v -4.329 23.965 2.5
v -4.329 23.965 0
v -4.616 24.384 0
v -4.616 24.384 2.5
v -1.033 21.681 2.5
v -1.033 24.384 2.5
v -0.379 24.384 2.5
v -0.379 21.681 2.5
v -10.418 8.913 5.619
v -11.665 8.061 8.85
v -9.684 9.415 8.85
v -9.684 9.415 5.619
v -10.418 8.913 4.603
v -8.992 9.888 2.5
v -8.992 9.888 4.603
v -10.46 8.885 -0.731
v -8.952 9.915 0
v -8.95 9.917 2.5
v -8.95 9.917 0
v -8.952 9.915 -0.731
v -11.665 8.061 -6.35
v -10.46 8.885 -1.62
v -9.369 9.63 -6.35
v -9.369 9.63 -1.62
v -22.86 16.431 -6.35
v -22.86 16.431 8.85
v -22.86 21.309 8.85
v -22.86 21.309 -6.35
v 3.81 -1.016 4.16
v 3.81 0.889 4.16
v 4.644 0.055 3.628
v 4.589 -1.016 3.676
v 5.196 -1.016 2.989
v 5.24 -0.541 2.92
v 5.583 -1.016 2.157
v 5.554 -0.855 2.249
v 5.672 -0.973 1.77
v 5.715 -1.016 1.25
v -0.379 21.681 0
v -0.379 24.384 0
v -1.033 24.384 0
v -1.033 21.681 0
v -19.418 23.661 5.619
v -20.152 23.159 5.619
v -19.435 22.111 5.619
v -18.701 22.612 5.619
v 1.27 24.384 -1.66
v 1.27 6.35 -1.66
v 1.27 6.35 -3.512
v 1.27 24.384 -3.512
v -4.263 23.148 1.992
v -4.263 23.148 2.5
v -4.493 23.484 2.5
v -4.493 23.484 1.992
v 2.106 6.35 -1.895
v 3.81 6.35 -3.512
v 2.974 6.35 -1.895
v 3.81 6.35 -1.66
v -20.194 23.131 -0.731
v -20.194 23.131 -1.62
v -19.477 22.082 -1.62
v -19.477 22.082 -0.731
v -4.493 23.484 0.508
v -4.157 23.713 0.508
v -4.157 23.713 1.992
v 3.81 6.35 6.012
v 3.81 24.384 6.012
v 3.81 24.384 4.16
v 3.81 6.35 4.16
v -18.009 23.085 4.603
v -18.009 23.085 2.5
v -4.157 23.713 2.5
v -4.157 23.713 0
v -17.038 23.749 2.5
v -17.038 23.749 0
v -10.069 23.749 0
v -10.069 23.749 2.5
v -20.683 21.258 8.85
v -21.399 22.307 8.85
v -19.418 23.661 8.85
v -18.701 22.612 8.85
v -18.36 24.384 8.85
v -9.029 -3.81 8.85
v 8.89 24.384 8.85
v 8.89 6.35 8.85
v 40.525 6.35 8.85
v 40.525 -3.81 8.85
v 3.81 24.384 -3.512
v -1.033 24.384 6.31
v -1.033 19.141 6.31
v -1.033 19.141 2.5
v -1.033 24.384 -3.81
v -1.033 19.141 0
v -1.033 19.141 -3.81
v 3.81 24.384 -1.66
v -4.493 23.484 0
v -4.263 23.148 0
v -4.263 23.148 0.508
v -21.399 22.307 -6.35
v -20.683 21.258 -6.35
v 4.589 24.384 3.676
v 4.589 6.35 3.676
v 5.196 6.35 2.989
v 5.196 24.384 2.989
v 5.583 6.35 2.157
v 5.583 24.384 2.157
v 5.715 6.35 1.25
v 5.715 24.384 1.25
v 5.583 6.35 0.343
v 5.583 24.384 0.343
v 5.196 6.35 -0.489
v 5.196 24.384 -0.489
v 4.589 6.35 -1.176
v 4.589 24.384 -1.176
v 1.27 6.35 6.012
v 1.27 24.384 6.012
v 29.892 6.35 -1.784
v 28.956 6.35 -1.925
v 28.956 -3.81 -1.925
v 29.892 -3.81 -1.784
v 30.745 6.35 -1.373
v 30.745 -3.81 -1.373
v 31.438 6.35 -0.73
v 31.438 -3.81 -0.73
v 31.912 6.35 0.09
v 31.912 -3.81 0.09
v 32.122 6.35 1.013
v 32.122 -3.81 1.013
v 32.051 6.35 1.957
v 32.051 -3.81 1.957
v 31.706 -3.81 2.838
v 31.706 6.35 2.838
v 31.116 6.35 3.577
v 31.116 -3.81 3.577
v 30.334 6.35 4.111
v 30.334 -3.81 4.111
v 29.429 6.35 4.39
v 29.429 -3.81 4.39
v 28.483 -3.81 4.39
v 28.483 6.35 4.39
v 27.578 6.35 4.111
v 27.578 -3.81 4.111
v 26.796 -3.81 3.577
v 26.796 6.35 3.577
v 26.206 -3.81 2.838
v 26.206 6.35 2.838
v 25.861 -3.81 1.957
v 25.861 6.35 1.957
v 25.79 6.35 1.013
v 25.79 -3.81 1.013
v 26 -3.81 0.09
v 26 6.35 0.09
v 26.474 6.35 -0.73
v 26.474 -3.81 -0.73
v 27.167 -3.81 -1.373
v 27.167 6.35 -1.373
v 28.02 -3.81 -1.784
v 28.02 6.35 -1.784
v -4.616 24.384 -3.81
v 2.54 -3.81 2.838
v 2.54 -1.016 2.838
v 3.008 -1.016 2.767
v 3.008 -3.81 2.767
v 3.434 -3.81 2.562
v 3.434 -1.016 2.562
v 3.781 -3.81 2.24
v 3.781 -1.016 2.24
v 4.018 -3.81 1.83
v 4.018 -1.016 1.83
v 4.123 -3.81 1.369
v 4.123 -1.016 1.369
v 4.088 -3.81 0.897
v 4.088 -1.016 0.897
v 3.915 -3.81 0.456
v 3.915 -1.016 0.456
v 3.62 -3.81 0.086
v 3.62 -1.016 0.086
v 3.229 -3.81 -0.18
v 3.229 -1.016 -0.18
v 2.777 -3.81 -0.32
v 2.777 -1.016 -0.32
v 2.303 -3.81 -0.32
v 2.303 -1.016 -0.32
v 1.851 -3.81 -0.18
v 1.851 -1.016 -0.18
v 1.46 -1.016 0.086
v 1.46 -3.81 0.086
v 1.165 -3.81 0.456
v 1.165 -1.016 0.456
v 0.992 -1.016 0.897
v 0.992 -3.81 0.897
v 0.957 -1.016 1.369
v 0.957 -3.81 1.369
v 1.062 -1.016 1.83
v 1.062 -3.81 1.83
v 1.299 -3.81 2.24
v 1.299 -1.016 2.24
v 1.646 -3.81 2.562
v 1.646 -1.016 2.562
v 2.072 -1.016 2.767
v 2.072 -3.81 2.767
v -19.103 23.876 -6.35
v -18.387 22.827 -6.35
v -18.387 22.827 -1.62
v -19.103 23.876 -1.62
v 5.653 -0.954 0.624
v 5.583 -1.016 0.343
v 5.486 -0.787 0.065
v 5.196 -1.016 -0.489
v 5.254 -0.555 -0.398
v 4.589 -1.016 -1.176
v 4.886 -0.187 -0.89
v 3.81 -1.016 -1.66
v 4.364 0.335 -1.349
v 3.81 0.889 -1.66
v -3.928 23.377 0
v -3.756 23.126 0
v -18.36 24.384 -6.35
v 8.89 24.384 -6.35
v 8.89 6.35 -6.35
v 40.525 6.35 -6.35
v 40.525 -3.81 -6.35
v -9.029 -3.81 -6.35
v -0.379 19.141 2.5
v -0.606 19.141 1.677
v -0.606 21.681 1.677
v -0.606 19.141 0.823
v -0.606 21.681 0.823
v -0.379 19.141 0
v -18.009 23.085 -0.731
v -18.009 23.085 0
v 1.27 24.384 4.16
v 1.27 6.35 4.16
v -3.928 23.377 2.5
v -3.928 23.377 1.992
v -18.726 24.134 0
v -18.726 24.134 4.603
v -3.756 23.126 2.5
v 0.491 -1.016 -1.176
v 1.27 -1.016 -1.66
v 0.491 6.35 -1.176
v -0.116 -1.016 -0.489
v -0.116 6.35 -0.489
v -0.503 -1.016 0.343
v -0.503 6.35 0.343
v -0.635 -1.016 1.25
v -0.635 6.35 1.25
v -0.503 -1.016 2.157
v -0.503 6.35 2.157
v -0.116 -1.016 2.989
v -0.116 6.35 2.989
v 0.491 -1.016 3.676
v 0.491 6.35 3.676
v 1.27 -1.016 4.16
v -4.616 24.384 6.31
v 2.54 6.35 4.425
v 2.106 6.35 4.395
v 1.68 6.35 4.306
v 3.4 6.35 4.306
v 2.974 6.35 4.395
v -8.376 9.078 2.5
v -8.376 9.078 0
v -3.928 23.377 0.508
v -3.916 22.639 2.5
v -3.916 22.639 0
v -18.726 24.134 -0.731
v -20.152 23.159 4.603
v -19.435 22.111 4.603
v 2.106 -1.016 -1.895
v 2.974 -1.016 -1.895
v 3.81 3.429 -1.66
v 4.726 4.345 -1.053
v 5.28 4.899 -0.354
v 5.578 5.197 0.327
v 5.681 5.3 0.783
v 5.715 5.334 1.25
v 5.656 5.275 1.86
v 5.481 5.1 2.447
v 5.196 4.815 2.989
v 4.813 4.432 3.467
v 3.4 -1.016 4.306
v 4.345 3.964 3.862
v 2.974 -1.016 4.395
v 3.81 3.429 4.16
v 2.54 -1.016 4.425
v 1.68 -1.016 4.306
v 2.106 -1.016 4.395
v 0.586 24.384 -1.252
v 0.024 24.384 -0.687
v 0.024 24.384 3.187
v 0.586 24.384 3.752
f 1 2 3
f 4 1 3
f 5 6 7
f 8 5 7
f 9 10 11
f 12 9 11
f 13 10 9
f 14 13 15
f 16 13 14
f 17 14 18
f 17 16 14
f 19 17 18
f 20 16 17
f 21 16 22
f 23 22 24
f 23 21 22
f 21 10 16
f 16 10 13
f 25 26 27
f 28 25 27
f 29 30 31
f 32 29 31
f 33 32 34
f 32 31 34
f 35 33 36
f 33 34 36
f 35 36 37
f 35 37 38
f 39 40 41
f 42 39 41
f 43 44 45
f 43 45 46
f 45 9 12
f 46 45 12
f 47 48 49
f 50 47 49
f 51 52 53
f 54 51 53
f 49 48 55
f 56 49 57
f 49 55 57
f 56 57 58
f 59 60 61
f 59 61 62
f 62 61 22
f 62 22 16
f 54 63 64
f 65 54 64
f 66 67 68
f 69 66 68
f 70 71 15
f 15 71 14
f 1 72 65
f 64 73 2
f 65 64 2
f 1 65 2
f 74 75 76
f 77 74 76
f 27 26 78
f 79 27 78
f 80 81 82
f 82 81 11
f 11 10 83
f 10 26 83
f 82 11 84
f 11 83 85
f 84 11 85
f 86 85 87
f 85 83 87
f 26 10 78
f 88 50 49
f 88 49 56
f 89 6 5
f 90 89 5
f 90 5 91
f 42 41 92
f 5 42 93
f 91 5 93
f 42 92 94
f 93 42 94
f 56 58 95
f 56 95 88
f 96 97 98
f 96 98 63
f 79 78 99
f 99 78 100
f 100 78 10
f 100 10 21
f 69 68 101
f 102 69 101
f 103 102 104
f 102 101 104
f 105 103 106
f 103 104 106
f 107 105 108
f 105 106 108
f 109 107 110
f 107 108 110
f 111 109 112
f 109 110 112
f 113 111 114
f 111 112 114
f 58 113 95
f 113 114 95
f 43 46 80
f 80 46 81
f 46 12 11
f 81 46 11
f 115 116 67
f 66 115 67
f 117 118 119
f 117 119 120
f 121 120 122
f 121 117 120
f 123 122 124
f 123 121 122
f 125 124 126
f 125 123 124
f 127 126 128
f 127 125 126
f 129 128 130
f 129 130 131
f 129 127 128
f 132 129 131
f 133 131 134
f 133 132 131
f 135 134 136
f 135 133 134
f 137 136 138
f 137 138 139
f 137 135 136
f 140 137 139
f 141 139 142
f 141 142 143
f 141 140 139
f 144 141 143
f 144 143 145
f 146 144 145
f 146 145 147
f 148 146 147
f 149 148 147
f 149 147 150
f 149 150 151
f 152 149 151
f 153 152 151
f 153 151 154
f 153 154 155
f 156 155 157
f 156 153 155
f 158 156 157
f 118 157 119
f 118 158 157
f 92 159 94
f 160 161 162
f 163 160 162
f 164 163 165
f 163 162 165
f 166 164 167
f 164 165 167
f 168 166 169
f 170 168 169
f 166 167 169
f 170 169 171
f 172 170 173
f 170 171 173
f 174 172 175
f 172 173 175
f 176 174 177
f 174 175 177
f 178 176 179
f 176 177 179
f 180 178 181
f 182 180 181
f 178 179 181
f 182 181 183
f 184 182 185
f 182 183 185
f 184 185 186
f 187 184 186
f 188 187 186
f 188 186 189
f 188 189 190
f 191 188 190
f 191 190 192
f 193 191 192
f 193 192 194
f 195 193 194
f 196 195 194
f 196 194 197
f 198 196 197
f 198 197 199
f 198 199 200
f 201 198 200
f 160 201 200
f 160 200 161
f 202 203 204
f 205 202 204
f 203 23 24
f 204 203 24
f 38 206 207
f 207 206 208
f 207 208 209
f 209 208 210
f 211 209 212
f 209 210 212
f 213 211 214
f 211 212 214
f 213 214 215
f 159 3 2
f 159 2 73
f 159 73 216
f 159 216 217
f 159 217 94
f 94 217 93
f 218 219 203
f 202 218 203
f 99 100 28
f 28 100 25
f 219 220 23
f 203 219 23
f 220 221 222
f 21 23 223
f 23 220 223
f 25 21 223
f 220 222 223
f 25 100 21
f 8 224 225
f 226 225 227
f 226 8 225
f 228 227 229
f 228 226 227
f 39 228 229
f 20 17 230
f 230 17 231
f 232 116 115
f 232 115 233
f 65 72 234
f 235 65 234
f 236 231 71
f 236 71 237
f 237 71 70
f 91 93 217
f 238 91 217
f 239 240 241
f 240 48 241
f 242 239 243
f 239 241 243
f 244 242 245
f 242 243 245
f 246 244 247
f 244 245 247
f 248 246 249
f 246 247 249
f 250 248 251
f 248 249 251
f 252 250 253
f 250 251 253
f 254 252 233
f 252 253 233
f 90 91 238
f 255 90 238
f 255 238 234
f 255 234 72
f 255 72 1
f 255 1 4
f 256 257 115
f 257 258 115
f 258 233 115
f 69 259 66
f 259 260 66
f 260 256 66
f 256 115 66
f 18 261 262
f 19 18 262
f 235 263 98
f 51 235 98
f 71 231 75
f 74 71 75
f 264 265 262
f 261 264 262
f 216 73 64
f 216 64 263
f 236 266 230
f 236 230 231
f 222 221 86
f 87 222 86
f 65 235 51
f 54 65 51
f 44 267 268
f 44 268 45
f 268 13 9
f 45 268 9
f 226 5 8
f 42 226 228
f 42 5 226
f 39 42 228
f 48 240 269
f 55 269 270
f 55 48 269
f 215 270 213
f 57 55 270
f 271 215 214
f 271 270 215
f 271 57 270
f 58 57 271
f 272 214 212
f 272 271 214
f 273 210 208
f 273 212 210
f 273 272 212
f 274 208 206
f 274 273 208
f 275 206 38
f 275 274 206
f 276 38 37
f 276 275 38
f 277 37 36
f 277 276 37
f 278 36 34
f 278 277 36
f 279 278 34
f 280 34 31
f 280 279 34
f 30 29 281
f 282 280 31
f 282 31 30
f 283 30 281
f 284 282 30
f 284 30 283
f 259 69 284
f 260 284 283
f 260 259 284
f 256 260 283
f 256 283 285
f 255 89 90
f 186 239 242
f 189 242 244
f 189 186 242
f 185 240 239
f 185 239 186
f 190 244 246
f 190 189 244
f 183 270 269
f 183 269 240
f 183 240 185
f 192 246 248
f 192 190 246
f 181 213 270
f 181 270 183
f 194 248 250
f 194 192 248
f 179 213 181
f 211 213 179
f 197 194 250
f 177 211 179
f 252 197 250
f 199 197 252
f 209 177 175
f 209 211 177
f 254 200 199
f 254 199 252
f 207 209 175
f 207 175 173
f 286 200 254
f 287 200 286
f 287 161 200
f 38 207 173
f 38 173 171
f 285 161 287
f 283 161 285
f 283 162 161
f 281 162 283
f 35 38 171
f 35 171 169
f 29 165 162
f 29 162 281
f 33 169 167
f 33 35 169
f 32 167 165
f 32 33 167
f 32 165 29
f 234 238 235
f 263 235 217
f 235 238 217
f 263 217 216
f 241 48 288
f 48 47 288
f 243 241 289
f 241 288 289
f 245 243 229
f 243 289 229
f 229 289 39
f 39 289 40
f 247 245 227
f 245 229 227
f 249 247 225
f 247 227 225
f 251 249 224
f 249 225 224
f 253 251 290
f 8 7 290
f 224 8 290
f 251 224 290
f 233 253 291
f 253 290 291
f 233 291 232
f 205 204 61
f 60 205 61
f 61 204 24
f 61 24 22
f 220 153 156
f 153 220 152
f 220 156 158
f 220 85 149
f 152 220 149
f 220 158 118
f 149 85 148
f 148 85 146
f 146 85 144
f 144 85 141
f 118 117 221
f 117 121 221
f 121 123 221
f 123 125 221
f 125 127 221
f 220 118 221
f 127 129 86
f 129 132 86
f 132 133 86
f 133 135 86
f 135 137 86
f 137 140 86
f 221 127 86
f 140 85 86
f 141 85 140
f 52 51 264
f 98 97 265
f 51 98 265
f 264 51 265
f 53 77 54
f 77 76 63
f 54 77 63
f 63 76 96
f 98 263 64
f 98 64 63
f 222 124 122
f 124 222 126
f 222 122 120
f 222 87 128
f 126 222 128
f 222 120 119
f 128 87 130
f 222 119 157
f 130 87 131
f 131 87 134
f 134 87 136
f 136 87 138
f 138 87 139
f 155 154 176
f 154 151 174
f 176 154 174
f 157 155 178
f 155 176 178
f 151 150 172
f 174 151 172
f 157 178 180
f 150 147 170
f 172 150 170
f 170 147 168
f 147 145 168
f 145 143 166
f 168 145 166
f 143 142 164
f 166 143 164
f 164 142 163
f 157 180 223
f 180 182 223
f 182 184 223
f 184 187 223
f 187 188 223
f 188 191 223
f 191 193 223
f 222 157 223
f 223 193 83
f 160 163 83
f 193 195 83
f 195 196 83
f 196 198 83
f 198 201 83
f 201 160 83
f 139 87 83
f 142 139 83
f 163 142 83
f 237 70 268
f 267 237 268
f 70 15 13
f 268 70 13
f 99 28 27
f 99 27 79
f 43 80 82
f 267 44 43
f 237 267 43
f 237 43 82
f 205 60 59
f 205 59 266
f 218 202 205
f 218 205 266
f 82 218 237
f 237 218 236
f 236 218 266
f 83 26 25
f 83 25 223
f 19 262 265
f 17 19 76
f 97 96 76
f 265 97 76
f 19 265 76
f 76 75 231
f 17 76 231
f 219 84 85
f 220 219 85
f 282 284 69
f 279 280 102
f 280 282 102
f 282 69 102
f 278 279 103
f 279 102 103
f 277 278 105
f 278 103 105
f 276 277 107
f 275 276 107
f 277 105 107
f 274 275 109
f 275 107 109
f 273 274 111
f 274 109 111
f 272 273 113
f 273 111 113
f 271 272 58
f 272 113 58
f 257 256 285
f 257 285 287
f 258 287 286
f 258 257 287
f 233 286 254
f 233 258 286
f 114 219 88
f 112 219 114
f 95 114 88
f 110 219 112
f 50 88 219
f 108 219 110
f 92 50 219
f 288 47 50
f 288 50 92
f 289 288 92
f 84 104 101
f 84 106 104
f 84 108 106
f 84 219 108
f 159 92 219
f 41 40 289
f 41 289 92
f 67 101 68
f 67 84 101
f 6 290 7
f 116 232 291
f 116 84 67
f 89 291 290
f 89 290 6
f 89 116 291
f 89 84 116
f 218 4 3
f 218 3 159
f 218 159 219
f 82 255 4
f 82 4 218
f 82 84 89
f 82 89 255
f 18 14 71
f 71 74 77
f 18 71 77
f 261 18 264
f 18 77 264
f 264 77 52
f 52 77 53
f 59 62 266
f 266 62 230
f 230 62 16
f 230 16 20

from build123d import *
from build123d.topology import SkipClean

# Parameters (mm, degrees)
BOSS_EXTRUDE1_DEPTH     = 2.5
BOSS_EXTRUDE1_2_DEPTH   = 2.5
BOSS_EXTRUDE2_DEPTH     = 6.35
BOSS_EXTRUDE3_DEPTH     = 6.35
SKETCH4_R               = 3.175
CUT_EXTRUDE1_DEPTH      = 25.4
SKETCH5_R               = 1.5875
CUT_EXTRUDE2_DEPTH      = 25.4
CUT_EXTRUDE3_DEPTH      = 25.4
CUT_EXTRUDE4_REACH      = 43
CUT_EXTRUDE4_END_RADIUS = 3.175
CUT_EXTRUDE5_REACH      = 39.36
SKETCH8_W               = 2.54
SKETCH8_H               = 9.525
SKETCH9_W               = 0.7112
SKETCH9_H               = 15.2
BOSS_EXTRUDE4_DEPTH     = 17
BOSS_EXTRUDE5_DEPTH     = 1.016
SKETCH11_W              = 1.176658287
SKETCH11_H              = 2.5
SKETCH11_W_2            = 2.636987944
SKETCH11_H_2            = 15.2
BOSS_EXTRUDE6_DEPTH     = 1.27
CUT_EXTRUDE6_DEPTH      = 38.864332241
BOSS_EXTRUDE7_START     = 2.54
BOSS_EXTRUDE7_DEPTH     = 2.54
BOSS_EXTRUDE8_DEPTH     = 2.54
BOSS_EXTRUDE9_DEPTH     = 0.508
BOSS_EXTRUDE10_DEPTH    = 0.508
CUT_EXTRUDE7_DEPTH      = 3.81
CUT_EXTRUDE8_DEPTH      = 3.81
BOSS_EXTRUDE11_DEPTH    = 3.81
BOSS_EXTRUDE12_START    = -10.16
SKETCH21_W              = 49.554714962
SKETCH21_H              = 15.2
SKETCH21_R              = 3.175
BOSS_EXTRUDE12_DEPTH    = 10.16


with BuildPart() as part:
    # Sketch1 → Boss-Extrude1 (new body)
    with BuildSketch(Plane.XY):
        Polygon((5.08, 0), (0, 0), (0, 19.141079028), (-1.033059908, 19.141079028), (-3.75575709, 23.125698967), (-8.376397661, 9.077684872), (-11.679025045, 6.820994294), (-21.26996, 20.857160675), (-22.86, 19.770683798), (-22.86, -3.81), (8.89, -3.81), (8.89, 24.384), (5.08, 24.384), align=None)
    extrude(amount=BOSS_EXTRUDE1_DEPTH)



with BuildPart() as body_2:
    # Sketch1 → Boss-Extrude1 2 (new body)
    with BuildSketch(Plane.XY):
        Polygon((-10.069369191, 23.749), (-4.328956497, 23.964566322), (-4.615556201, 24.384), (-16.108492032, 24.384), (-17.03780348, 23.749), align=None)
    extrude(amount=BOSS_EXTRUDE1_2_DEPTH)


with BuildPart() as part_1:
    add(part.part)

    add(body_2.part)  # Boss-Extrude2 merges body 2
    # Sketch2 → Boss-Extrude2 (add)
    with BuildSketch(Plane.XY.offset(2.5)):
        Polygon((-11.679025045, 6.820994294), (-21.26996, 20.857160675), (-22.86, 19.770683798), (-22.86, -3.81), (8.89, -3.81), (8.89, 24.384), (5.08, 24.384), (5.08, 0), (0, 0), (0, 19.141079028), (-1.033059908, 19.141079028), (-3.75575709, 23.125698967), (-8.376397661, 9.077684872), align=None)
        Polygon((-16.108492032, 24.384), (-18.00931945, 23.085161582), (-8.418384495, 9.048995201), (-8.376397661, 9.077684872), (-3.75575709, 23.125698967), (-1.033059908, 19.141079028), (0, 19.141079028), (0, 0), (5.08, 0), (5.08, 24.384), align=None)
    extrude(amount=BOSS_EXTRUDE2_DEPTH)

    # Sketch3 → Boss-Extrude3 (add)
    with BuildSketch(Plane(origin=(0, 0, 0), x_dir=(-1, 0, 0), z_dir=(0, 0, -1))):
        Polygon((-8.89, 24.384), (-8.89, -3.81), (22.86, -3.81), (22.86, 19.770683798), (21.26996, 20.857160675), (11.679025045, 6.820994294), (8.376397661, 9.077684872), (18.00931945, 23.085161582), (16.108492032, 24.384), align=None)
    extrude(amount=BOSS_EXTRUDE3_DEPTH)

    # Sketch4 → Cut-Extrude1 (cut)
    with BuildSketch(Plane(origin=(0, 24.384, 0), x_dir=(1, 0, 0), z_dir=(0, 1, 0))):
        with Locations(Location((2.54, -1.25, 0), (0, 0, 270))):
            Circle(SKETCH4_R)
    extrude(amount=-CUT_EXTRUDE1_DEPTH, mode=Mode.SUBTRACT)

    # Sketch5 → Cut-Extrude2 (cut)
    with BuildSketch(Plane(origin=(0, -1.016, 0), x_dir=(1, 0, 0), z_dir=(0, 1, 0))):
        with Locations(Location((2.54, -1.25, 0), (0, 0, 270))):
            Circle(SKETCH5_R)
    extrude(amount=-CUT_EXTRUDE2_DEPTH, mode=Mode.SUBTRACT)

    # Sketch6 → Cut-Extrude3 (cut)
    with BuildSketch(Plane.XY.offset(8.85)):
        Polygon((-22.86, 16.430904611), (-9.029357481, -3.81), (-22.86, -3.81), align=None)
    extrude(amount=-CUT_EXTRUDE3_DEPTH, mode=Mode.SUBTRACT)

    # Cut-Extrude4: up to this cylinder (the profile starts outside it)
    with SkipClean():  # the faces are left unmerged after this step: merging them gives an invalid solid
        cut_extrude4_end = Plane(origin=(2.54, 2.159, 1.25), z_dir=(0, 1, 0)) * Cylinder(CUT_EXTRUDE4_END_RADIUS, 96.045024, mode=Mode.PRIVATE)
        # Sketch7 → Cut-Extrude4 (cut, up to the surface)
        with BuildSketch(Plane(origin=(8.89, 0, 0), x_dir=(0, 0, -1), z_dir=(1, 0, 0)), mode=Mode.PRIVATE) as cut_extrude4_sk1:
            with BuildLine():
                ThreePointArc((1.925, 2.159), (-1.25, 5.334), (-4.425, 2.159))
                Line((-4.425, 2.159), (1.925, 2.159))
            make_face()
        cut_extrude4_tool1 = extrude(cut_extrude4_sk1.sketch, amount=-CUT_EXTRUDE4_REACH, mode=Mode.PRIVATE) - cut_extrude4_end
        add(cut_extrude4_tool1.solids().sort_by_distance((8.89, 3.506512, 1.25))[0], mode=Mode.SUBTRACT)
        # Sketch7 → Cut-Extrude4 (cut, up to the surface)
        with BuildSketch(Plane(origin=(8.89, 0, 0), x_dir=(0, 0, -1), z_dir=(1, 0, 0)), mode=Mode.PRIVATE) as cut_extrude4_sk2:
            with BuildLine():
                Line((1.925, 2.159), (-4.425, 2.159))
                ThreePointArc((-4.425, 2.159), (-3.49506403, -0.08606403), (-1.25, -1.016))
                ThreePointArc((-1.25, -1.016), (0.99506403, -0.08606403), (1.925, 2.159))
            make_face()
        cut_extrude4_tool2 = extrude(cut_extrude4_sk2.sketch, amount=-CUT_EXTRUDE4_REACH, mode=Mode.PRIVATE) - cut_extrude4_end
        add(cut_extrude4_tool2.solids().sort_by_distance((8.89, 0.811488, 1.25))[0], mode=Mode.SUBTRACT)
        # Sketch7 → Cut-Extrude4 (cut, up to the surface)
        with BuildSketch(Plane(origin=(8.89, 0, 0), x_dir=(0, 0, -1), z_dir=(1, 0, 0)), mode=Mode.PRIVATE) as cut_extrude4_sk3:
            with BuildLine():
                ThreePointArc((1.925, 2.159), (-1.25, 5.334), (-4.425, 2.159))
                Line((-4.425, 2.159), (1.925, 2.159))
            make_face()
        cut_extrude4_tool3 = extrude(cut_extrude4_sk3.sketch, amount=-CUT_EXTRUDE4_REACH, mode=Mode.PRIVATE) - cut_extrude4_end
        add(cut_extrude4_tool3.solids().sort_by_distance((8.89, 3.506512, 1.25))[0], mode=Mode.SUBTRACT)
        # Sketch7 → Cut-Extrude4 (cut, up to the surface)
        with BuildSketch(Plane(origin=(8.89, 0, 0), x_dir=(0, 0, -1), z_dir=(1, 0, 0)), mode=Mode.PRIVATE) as cut_extrude4_sk4:
            with BuildLine():
                Line((1.925, 2.159), (-4.425, 2.159))
                ThreePointArc((-4.425, 2.159), (-3.49506403, -0.08606403), (-1.25, -1.016))
                ThreePointArc((-1.25, -1.016), (0.99506403, -0.08606403), (1.925, 2.159))
            make_face()
        cut_extrude4_tool4 = extrude(cut_extrude4_sk4.sketch, amount=-CUT_EXTRUDE4_REACH, mode=Mode.PRIVATE) - cut_extrude4_end
        add(cut_extrude4_tool4.solids().sort_by_distance((8.89, 0.811488, 1.25))[0], mode=Mode.SUBTRACT)

    # Cut-Extrude5: up to this face of the body (flat: up to its plane)
    cut_extrude5_end = Plane(part_1.part.faces().sort_by_distance((4.72156403, -1.016, 3.43156403))[0])
    # Sketch8 → Cut-Extrude5 (cut, up to the picked face)
    with BuildSketch(Plane(origin=(0, 24.384, 0), x_dir=(1, 0, 0), z_dir=(0, 1, 0)), mode=Mode.PRIVATE) as cut_extrude5_sk1:
        with Locations((2.54, -1.25)):
            Rectangle(SKETCH8_W, SKETCH8_H)
    cut_extrude5_tool1 = split(extrude(cut_extrude5_sk1.sketch, amount=-CUT_EXTRUDE5_REACH, mode=Mode.PRIVATE), bisect_by=cut_extrude5_end, keep=Keep.BOTH, mode=Mode.PRIVATE)
    add(cut_extrude5_tool1.solids().sort_by(Axis((2.54, 24.384, 1.25), (0, -1, 0)))[0], mode=Mode.SUBTRACT)

    # Sketch9 → Boss-Extrude4 (add)
    with BuildSketch(Plane(origin=(-6.894633763, 10.090176515, 0), x_dir=(0.825656845959394, 0.5641726444275594, 0), z_dir=(-0.5641726444275594, 0.825656845959394, 0))):
        with Locations((-5.439048594, -1.25)):
            Rectangle(SKETCH9_W, SKETCH9_H)
        Polygon((-1.794648594, 6.35), (-2.302648594, 6.35), (-2.302648594, 1.6202), (-3.623501238, 1.6202), (-3.623501238, 0.7312), (-1.794648594, 0.7312), align=None)
        Polygon((-1.845501238, -8.85), (-1.845501238, -4.6028), (-3.572648594, -4.6028), (-3.572648594, -5.6188), (-2.683648594, -5.6188), (-2.683648594, -8.85), align=None)
    extrude(amount=BOSS_EXTRUDE4_DEPTH)

    # Sketch10 → Boss-Extrude5 (add)
    with BuildSketch(Plane(origin=(-6.894633763, 10.090176515, 0), x_dir=(0.8256568459593948, 0.5641726444275585, 0), z_dir=(-0.5641726444275585, 0.8256568459593948, 0))):
        Polygon((-5.083448594, -8.85), (-2.683648594, -8.85), (-2.683648594, -5.6188), (-3.572648594, -5.6188), (-3.572648594, -4.6028), (-1.845501238, -4.6028), (-1.845501238, -2.5), (-1.794648594, -2.5), (-1.794648594, 0), (-1.794648594, 0.7312), (-3.623501238, 0.7312), (-3.623501238, 1.6202), (-2.302648594, 1.6202), (-2.302648594, 6.35), (-5.083448594, 6.35), align=None)
    extrude(amount=BOSS_EXTRUDE5_DEPTH)

    # Sketch11 → Boss-Extrude6 (add)
    with BuildSketch(Plane(origin=(-16.485568719, 24.126342896, 0), x_dir=(0.8256568459593935, 0.5641726444275603, 0), z_dir=(-0.5641726444275603, 0.8256568459593935, 0))):
        with Locations((-1.257172095, -1.25)):
            Rectangle(SKETCH11_W, SKETCH11_H)
        Polygon((-3.623501238, 1.6202), (-3.623501238, 0.7312), (-1.845501238, 0.7312), (-1.845501238, 0), (-0.668842951, 0), (-0.668842951, -2.5), (-1.845501238, -2.5), (-1.845501238, -4.6028), (-3.572648594, -4.6028), (-3.572648594, -5.6188), (-2.683648594, -5.6188), (-2.683648594, -8.85), (0.456699038, -8.85), (0.456699038, 6.35), (-2.302648594, 6.35), (-2.302648594, 1.6202), align=None)
        with Locations((-6.401942566, -1.25)):
            Rectangle(SKETCH11_W_2, SKETCH11_H_2)
    extrude(amount=BOSS_EXTRUDE6_DEPTH)

    # Sketch12 → Cut-Extrude6 (cut, through all)
    with BuildSketch(Plane.XY.offset(8.85)):
        Polygon((-16.108492032, 24.384), (-18.359576008, 24.384), (-16.82499129, 25.432584194), align=None)
        Polygon((-22.86, 19.770683798), (-22.86, 21.308853083), (-23.576499258, 20.819267993), align=None)
    extrude(amount=-CUT_EXTRUDE6_DEPTH, mode=Mode.SUBTRACT)

    # Sketch13 → Boss-Extrude7 (add)
    with BuildSketch(Plane(origin=(0, 19.141079028, 0), x_dir=(1, 0, 0), z_dir=(0, 1, 0)).offset(BOSS_EXTRUDE7_START)):
        with BuildLine():
            Line((-0.378582704, 0), (-1.033059908, 0))
            Line((-1.033059908, 0), (-1.033059908, -2.5))
            Line((-1.033059908, -2.5), (-0.378582704, -2.5))
            ThreePointArc((-0.378582704, -2.5), (-0.635, -1.25), (-0.378582704, 0))
        make_face()
    extrude(amount=-BOSS_EXTRUDE7_DEPTH)

    # Sketch15 → Boss-Extrude8 (add)
    with BuildSketch(Plane.XY):
        Polygon((-4.156996675, 23.712906116), (-4.328956497, 23.964566322), (-4.808856613, 23.946544917), (-4.492543617, 23.483626353), align=None)
        Polygon((-3.75575709, 23.125698967), (-3.927716912, 23.377359173), (-4.263263855, 23.148079411), (-3.915700647, 22.639426706), align=None)
    extrude(amount=BOSS_EXTRUDE8_DEPTH)

    # Sketch16 → Boss-Extrude9 (add)
    with BuildSketch(Plane.XY):
        Polygon((-4.263263855, 23.148079411), (-4.492543617, 23.483626353), (-4.156996675, 23.712906116), (-3.927716912, 23.377359173), align=None)
    extrude(amount=BOSS_EXTRUDE9_DEPTH)

    # Sketch17 → Boss-Extrude10 (add)
    with BuildSketch(Plane(origin=(0, 0, 2.5), x_dir=(-1, 0, 0), z_dir=(0, 0, -1))):
        Polygon((4.263263855, 23.148079411), (4.492543617, 23.483626353), (4.156996675, 23.712906116), (3.927716912, 23.377359173), align=None)
    extrude(amount=BOSS_EXTRUDE10_DEPTH)

    # Sketch18 → Cut-Extrude7 (cut)
    with BuildSketch(Plane(origin=(0, 0, 2.5), x_dir=(-1, 0, 0), z_dir=(0, 0, -1))):
        Polygon((1.033059908, 24.384), (1.033059908, 21.681079028), (1.033059908, 19.141079028), (4.615556201, 24.384), align=None)
    extrude(amount=-CUT_EXTRUDE7_DEPTH, mode=Mode.SUBTRACT)

    # Sketch19 → Cut-Extrude8 (cut)
    with BuildSketch(Plane.XY):
        Polygon((-1.033059908, 19.141079028), (-1.033059908, 21.681079028), (-1.033059908, 24.384), (-4.615556201, 24.384), align=None)
    extrude(amount=-CUT_EXTRUDE8_DEPTH, mode=Mode.SUBTRACT)

    # Sketch20 → Boss-Extrude11 (add)
    with BuildSketch(Plane.XY):
        Polygon((-10.069369191, 23.749), (-4.492543617, 23.483626353), (-4.808856613, 23.946544917), align=None)
    extrude(amount=BOSS_EXTRUDE11_DEPTH)

    # Sketch21 → Boss-Extrude12 (add)
    with BuildSketch(Plane.XZ.offset(3.81).offset(BOSS_EXTRUDE12_START)):
        with Locations((15.748, 1.25)):
            Rectangle(SKETCH21_W, SKETCH21_H)
        with Locations(Location((2.54, 1.25, 0), (0, 0, 90))):
            Circle(SKETCH21_R, mode=Mode.SUBTRACT)
        with Locations(Location((28.956, 1.25, 0), (0, 0, 270))):
            Circle(SKETCH21_R, mode=Mode.SUBTRACT)
    extrude(amount=BOSS_EXTRUDE12_DEPTH)


solid = part_1.part
